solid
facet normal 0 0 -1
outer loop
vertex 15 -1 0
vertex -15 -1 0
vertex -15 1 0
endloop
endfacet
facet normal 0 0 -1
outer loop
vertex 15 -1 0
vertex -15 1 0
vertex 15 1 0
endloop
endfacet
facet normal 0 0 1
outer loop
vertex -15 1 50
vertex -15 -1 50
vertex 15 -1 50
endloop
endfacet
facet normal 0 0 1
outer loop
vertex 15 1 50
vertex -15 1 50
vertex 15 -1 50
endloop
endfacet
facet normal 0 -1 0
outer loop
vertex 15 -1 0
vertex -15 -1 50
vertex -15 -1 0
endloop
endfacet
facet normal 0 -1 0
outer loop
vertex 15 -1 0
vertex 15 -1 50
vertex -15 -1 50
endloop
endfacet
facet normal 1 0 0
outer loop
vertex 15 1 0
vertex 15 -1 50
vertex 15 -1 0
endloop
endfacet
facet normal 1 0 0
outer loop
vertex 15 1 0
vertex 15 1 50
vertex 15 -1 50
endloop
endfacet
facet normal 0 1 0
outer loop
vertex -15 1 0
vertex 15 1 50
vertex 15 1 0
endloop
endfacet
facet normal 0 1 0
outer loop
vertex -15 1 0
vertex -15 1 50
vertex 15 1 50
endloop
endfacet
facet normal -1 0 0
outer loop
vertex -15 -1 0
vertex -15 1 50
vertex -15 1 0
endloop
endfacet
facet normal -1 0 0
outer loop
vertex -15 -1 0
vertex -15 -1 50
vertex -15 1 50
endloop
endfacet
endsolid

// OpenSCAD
// extruded wall - for j-box

height = 50;
thickness = 2;
length = 30;

linear_extrude(height)
square([length, thickness], center = true);
